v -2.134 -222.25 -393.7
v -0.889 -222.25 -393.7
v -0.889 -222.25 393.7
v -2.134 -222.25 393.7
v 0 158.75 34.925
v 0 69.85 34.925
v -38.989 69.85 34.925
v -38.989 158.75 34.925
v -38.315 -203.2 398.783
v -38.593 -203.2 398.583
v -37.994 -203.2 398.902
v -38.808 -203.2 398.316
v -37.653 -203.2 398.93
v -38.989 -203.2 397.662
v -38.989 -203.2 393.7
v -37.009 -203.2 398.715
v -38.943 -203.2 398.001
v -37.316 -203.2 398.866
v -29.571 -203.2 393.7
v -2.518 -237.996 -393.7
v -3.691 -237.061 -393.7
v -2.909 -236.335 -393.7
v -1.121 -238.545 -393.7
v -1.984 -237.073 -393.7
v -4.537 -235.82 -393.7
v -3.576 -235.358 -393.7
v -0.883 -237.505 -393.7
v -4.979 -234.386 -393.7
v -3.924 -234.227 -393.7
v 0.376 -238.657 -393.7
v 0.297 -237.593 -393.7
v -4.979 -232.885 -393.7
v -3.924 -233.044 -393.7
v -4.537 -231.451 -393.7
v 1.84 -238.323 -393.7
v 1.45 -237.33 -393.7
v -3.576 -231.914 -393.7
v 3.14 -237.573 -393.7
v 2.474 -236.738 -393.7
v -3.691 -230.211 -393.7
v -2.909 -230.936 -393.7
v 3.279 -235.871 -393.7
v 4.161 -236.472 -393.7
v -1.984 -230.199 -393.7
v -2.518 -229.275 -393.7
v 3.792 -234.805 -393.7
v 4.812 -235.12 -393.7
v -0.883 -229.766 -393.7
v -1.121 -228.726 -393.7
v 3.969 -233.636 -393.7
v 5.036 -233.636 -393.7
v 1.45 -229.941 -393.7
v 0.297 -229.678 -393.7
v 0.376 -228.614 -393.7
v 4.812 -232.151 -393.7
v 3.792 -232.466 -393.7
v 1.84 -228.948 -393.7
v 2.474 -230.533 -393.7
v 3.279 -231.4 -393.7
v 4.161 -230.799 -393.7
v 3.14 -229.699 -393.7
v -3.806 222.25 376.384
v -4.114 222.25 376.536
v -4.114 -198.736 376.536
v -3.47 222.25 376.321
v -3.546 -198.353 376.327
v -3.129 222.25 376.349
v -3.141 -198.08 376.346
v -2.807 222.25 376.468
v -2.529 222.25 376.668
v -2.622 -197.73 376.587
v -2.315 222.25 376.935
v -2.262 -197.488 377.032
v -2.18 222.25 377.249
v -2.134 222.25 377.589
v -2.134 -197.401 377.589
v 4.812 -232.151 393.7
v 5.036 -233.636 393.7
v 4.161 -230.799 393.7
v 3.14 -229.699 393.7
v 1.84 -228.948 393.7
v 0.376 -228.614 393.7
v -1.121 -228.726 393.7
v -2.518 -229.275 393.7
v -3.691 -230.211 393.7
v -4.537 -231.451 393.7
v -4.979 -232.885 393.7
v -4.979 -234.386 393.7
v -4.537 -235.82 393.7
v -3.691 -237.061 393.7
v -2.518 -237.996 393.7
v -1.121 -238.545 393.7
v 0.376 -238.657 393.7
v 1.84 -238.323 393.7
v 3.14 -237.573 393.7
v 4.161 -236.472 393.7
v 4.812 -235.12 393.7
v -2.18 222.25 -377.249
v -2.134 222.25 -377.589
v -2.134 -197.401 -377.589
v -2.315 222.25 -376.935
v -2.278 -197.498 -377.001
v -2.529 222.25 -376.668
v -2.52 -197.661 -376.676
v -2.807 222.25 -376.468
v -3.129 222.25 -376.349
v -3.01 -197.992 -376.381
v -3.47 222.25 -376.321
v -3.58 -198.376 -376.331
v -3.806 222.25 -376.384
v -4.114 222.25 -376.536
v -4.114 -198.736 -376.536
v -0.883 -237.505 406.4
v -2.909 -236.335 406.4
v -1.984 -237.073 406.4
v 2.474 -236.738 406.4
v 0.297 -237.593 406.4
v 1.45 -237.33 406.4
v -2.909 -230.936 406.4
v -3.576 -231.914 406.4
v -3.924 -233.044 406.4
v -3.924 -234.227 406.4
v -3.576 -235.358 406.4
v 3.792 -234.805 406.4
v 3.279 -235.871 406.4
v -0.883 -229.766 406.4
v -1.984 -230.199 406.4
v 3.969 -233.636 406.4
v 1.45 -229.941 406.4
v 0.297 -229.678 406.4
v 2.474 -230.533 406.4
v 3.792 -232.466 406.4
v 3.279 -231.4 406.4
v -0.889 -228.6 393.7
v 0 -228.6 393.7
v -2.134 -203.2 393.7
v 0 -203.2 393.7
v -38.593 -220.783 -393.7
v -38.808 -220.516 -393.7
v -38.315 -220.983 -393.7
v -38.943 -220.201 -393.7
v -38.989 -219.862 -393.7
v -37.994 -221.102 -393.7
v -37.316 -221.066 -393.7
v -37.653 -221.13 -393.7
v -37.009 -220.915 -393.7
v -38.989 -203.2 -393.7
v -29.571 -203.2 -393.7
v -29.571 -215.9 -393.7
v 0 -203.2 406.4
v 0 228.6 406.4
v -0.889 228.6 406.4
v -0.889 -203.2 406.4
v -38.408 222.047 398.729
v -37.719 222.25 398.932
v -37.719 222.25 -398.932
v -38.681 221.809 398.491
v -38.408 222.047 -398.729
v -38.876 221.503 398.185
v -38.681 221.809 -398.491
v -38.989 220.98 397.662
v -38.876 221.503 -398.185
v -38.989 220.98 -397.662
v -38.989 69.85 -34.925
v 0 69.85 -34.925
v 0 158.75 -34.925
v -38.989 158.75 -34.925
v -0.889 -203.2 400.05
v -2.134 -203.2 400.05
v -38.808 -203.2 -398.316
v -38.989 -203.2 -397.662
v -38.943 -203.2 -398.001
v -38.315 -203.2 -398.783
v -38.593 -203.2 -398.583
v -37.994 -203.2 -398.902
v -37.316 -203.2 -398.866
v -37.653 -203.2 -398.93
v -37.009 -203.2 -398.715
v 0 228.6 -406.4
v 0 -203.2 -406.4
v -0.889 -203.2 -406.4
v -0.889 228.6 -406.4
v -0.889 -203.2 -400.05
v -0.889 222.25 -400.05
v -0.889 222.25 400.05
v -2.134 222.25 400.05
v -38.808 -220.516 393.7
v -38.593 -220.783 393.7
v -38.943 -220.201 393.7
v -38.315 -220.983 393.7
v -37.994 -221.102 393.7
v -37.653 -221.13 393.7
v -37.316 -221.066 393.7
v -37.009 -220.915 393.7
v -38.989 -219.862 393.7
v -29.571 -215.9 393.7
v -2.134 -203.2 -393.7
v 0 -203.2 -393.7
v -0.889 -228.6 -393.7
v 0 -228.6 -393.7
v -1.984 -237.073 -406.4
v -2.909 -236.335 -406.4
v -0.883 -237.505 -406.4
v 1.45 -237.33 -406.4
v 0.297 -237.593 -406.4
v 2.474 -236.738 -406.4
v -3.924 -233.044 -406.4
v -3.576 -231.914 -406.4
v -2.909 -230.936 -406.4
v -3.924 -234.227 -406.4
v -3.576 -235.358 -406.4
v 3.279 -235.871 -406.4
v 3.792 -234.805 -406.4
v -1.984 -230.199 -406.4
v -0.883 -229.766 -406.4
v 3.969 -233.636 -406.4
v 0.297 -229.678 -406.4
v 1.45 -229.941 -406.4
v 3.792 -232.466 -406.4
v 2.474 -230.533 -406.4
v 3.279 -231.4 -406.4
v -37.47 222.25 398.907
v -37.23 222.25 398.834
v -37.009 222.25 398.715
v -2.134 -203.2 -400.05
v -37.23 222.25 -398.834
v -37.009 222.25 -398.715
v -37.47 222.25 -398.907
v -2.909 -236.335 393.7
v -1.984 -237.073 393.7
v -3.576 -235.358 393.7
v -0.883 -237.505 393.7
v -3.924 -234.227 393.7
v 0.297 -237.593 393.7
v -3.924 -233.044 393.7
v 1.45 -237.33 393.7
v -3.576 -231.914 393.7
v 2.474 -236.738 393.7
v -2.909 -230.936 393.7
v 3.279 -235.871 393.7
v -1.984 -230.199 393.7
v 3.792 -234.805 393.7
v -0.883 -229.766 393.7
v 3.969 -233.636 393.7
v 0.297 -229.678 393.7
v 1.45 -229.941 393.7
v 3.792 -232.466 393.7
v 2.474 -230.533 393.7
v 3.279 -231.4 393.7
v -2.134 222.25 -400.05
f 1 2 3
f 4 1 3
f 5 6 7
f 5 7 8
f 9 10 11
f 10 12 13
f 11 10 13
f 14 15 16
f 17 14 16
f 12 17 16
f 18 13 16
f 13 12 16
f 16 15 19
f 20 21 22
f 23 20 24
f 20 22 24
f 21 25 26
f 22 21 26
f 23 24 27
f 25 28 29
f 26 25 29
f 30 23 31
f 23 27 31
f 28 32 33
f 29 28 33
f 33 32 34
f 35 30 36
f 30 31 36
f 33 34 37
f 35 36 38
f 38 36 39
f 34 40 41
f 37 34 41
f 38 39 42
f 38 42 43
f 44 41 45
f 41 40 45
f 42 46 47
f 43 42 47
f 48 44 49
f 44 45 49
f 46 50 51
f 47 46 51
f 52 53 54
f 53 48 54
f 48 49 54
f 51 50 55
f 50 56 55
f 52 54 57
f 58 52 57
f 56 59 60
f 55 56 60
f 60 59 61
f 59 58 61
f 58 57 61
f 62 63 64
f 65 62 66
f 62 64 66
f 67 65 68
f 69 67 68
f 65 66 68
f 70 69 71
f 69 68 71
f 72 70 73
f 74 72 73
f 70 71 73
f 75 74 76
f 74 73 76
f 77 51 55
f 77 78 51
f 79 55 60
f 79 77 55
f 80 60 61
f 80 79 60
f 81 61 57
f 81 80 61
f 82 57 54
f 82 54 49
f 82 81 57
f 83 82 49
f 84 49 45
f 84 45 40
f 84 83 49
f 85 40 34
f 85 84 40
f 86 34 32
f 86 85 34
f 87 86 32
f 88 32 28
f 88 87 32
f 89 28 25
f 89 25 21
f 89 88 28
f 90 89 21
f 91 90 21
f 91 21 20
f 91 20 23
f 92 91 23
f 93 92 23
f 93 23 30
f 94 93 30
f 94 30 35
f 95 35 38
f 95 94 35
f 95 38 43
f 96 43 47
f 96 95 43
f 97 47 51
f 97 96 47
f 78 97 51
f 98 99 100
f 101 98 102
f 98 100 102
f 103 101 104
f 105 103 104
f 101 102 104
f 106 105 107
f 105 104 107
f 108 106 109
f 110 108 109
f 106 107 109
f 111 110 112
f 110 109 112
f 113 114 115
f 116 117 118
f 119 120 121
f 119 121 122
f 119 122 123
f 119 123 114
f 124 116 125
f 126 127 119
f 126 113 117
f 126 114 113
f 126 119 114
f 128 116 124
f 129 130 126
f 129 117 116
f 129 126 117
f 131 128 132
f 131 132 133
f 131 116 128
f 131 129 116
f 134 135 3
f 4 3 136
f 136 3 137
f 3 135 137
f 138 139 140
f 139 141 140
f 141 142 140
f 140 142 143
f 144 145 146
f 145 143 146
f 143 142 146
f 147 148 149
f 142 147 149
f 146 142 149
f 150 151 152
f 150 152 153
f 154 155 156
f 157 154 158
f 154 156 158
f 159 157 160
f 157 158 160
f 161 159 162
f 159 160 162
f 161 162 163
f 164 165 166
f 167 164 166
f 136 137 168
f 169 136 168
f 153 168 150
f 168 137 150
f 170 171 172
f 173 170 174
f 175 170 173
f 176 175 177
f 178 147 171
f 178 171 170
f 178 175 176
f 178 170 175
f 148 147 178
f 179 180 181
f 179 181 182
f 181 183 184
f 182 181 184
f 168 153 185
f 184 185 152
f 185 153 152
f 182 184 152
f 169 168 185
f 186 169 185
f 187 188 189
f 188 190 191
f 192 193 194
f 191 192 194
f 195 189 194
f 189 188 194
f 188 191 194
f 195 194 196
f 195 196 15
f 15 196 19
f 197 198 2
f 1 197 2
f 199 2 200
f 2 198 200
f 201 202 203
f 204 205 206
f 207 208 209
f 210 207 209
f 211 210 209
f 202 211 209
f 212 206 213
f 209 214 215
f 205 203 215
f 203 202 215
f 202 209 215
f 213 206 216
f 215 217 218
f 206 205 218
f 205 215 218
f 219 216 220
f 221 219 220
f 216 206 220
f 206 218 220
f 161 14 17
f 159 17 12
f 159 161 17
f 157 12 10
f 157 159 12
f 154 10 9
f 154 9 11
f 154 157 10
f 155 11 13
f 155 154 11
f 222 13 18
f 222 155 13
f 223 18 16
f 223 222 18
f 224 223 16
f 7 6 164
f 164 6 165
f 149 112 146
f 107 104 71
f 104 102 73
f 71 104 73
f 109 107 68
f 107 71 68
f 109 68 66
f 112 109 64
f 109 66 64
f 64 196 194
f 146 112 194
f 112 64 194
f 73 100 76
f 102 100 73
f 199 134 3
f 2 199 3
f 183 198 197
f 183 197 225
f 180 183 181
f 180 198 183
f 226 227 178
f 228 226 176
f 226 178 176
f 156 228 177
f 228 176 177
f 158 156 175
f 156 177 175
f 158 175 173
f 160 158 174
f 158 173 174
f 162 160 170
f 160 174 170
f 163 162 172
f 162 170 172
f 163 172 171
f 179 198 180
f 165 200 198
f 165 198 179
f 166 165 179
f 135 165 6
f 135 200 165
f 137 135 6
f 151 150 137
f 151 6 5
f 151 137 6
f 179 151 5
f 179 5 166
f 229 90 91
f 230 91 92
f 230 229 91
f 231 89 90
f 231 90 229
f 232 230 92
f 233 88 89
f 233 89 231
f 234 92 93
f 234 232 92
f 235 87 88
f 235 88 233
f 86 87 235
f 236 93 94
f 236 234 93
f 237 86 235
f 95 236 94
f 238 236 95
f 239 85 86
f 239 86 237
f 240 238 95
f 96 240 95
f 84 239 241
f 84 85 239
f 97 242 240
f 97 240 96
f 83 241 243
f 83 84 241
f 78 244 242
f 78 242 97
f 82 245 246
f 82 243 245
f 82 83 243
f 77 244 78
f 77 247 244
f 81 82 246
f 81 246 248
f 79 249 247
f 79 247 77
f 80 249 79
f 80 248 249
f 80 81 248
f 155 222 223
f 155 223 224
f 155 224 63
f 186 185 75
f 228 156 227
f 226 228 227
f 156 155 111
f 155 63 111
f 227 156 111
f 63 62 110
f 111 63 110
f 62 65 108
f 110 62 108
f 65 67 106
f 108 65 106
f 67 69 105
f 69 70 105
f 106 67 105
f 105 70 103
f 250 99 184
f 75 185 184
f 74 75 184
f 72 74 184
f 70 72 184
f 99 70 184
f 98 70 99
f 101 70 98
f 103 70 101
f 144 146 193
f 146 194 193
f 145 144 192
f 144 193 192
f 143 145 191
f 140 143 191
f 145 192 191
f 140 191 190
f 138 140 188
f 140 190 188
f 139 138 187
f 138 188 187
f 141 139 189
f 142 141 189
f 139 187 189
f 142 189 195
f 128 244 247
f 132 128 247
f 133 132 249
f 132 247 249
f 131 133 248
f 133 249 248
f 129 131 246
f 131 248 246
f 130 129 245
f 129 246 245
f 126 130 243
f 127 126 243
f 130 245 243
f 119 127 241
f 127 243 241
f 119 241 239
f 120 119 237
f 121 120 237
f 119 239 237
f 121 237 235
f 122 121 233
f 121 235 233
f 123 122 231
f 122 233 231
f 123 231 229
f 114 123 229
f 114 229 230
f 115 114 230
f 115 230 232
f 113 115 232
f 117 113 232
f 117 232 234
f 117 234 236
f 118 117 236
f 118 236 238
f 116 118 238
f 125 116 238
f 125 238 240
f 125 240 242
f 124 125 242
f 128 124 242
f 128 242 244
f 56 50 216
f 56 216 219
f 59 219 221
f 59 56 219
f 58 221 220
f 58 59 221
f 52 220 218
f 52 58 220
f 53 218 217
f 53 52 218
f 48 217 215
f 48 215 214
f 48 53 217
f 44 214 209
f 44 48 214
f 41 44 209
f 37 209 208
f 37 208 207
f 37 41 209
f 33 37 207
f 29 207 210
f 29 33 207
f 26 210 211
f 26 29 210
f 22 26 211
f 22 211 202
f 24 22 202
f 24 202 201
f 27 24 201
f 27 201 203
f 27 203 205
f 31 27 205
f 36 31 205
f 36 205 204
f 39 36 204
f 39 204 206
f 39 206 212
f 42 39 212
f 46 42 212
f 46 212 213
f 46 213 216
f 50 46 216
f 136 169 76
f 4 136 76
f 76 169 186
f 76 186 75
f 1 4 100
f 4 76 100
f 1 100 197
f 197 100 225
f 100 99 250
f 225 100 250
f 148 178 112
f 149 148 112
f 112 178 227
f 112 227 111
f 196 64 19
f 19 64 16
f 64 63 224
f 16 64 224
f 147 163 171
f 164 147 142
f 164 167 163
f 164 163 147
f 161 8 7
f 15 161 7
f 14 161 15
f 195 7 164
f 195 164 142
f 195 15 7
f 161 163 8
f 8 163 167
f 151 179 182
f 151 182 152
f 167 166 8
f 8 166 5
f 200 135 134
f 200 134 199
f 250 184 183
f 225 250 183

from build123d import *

# Parameters (mm, degrees)
F1_DEPTH       = 0.889
F3_DEPTH       = 38.1
F5_DEPTH       = 450.851
F7_DEPTH       = 806.451
F8_R           = 1.27
F9_R           = 1.27
F10_W          = 88.9
F10_H          = 34.925
F11_DEPTH      = 38.99
F12_R          = 5.03555
F12_R_2        = 3.96875
F13_DEPTH      = 393.7
F13_DEPTH_BACK = 393.7
F14_R          = 3.96875
F15_DEPTH      = 406.4
F15_DEPTH_BACK = 406.4


with BuildPart() as f1:
    # F0 (on Right) → F1 (new body)
    with BuildSketch(Plane.YZ):
        Polygon((228.6, 406.4), (-203.2, 406.4), (-203.2, 393.7), (-228.6, 393.7), (-228.6, 0), (228.6, 0), align=None)
        Polygon((228.6, -406.4), (228.6, 0), (-228.6, 0), (-228.6, -393.7), (-203.2, -393.7), (-203.2, -406.4), align=None)
    extrude(amount=-F1_DEPTH)

    # F2 (on face) → F3 (join)
    with BuildSketch(Plane(origin=(-0.889, 0, 0), x_dir=(0, -1, 0), z_dir=(-1, 0, 0))):
        Polygon((203.2, 400.05), (-222.25, 400.05), (-222.25, -400.05), (203.2, -400.05), (203.2, -393.7), (222.25, -393.7), (222.25, 393.7), (203.2, 393.7), align=None)
    extrude(amount=F3_DEPTH)

    # F4 (on face) → F5 (cut, through all)
    with BuildSketch(Plane(origin=(0, 222.25, 0), x_dir=(-1, 0, 0), z_dir=(0, 1, 0))):
        Polygon((2.1336, -400.05), (38.989, -400.05), (2.1336, -375.200815087), align=None)
        Polygon((2.1336, 375.200815087), (38.989, 400.05), (2.1336, 400.05), align=None)
    extrude(amount=-F5_DEPTH, mode=Mode.SUBTRACT)

    # F6 (on face) → F7 (cut, through all)
    with BuildSketch(Plane.XY.offset(400.05)):
        Polygon((-2.1336, 247.099184913), (-38.989, 222.25), (-2.1336, 222.25), align=None)
        Polygon((-2.1336, -203.2), (-2.1336, -197.400815087), (-38.989, -222.25), (-2.1336, -222.25), align=None)
    extrude(amount=-F7_DEPTH, mode=Mode.SUBTRACT)

    # F8
    f8_edges = [f1.edges().sort_by_distance(p)[0] for p in [
        (-38.989, 9.525, -400.05),
        (-38.989, 222.25, 0),
        (-38.989, 9.525, 400.05),
        (-38.989, -222.25, 0),
    ]]
    fillet(f8_edges, radius=F8_R)

    # F9
    f9_edges = [f1.edges().sort_by_distance(p)[0] for p in [
        (-2.1336, 12.424592, 375.200815),
        (-2.1336, 12.424592, -375.200815),
    ]]
    fillet(f9_edges, radius=F9_R)

    # F10 (on face) → F11 (cut, through all)
    with BuildSketch(Plane.YZ):
        with Locations((114.3, 17.4625)):
            Rectangle(F10_W, F10_H)
        with Locations((114.3, -17.4625)):
            Rectangle(F10_W, F10_H)
    extrude(amount=-F11_DEPTH, mode=Mode.SUBTRACT)


with BuildPart() as f13:
    # F12 (on Top) → F13 (new body, two sides)
    with BuildSketch(Plane.XY) as f13_sk:
        with Locations((0, -233.63555)):
            Circle(F12_R)
        with Locations((0, -233.63555)):
            Circle(F12_R_2, mode=Mode.SUBTRACT)
    extrude(amount=F13_DEPTH)
    extrude(f13_sk.sketch, amount=-F13_DEPTH_BACK)

    # F14 (on Top) → F15 (join, two sides)
    with BuildSketch(Plane.XY) as f15_sk:
        with Locations((0, -233.63555)):
            Circle(F14_R)
    extrude(amount=F15_DEPTH)
    extrude(f15_sk.sketch, amount=-F15_DEPTH_BACK)


solid = Compound([f1.part, f13.part])
